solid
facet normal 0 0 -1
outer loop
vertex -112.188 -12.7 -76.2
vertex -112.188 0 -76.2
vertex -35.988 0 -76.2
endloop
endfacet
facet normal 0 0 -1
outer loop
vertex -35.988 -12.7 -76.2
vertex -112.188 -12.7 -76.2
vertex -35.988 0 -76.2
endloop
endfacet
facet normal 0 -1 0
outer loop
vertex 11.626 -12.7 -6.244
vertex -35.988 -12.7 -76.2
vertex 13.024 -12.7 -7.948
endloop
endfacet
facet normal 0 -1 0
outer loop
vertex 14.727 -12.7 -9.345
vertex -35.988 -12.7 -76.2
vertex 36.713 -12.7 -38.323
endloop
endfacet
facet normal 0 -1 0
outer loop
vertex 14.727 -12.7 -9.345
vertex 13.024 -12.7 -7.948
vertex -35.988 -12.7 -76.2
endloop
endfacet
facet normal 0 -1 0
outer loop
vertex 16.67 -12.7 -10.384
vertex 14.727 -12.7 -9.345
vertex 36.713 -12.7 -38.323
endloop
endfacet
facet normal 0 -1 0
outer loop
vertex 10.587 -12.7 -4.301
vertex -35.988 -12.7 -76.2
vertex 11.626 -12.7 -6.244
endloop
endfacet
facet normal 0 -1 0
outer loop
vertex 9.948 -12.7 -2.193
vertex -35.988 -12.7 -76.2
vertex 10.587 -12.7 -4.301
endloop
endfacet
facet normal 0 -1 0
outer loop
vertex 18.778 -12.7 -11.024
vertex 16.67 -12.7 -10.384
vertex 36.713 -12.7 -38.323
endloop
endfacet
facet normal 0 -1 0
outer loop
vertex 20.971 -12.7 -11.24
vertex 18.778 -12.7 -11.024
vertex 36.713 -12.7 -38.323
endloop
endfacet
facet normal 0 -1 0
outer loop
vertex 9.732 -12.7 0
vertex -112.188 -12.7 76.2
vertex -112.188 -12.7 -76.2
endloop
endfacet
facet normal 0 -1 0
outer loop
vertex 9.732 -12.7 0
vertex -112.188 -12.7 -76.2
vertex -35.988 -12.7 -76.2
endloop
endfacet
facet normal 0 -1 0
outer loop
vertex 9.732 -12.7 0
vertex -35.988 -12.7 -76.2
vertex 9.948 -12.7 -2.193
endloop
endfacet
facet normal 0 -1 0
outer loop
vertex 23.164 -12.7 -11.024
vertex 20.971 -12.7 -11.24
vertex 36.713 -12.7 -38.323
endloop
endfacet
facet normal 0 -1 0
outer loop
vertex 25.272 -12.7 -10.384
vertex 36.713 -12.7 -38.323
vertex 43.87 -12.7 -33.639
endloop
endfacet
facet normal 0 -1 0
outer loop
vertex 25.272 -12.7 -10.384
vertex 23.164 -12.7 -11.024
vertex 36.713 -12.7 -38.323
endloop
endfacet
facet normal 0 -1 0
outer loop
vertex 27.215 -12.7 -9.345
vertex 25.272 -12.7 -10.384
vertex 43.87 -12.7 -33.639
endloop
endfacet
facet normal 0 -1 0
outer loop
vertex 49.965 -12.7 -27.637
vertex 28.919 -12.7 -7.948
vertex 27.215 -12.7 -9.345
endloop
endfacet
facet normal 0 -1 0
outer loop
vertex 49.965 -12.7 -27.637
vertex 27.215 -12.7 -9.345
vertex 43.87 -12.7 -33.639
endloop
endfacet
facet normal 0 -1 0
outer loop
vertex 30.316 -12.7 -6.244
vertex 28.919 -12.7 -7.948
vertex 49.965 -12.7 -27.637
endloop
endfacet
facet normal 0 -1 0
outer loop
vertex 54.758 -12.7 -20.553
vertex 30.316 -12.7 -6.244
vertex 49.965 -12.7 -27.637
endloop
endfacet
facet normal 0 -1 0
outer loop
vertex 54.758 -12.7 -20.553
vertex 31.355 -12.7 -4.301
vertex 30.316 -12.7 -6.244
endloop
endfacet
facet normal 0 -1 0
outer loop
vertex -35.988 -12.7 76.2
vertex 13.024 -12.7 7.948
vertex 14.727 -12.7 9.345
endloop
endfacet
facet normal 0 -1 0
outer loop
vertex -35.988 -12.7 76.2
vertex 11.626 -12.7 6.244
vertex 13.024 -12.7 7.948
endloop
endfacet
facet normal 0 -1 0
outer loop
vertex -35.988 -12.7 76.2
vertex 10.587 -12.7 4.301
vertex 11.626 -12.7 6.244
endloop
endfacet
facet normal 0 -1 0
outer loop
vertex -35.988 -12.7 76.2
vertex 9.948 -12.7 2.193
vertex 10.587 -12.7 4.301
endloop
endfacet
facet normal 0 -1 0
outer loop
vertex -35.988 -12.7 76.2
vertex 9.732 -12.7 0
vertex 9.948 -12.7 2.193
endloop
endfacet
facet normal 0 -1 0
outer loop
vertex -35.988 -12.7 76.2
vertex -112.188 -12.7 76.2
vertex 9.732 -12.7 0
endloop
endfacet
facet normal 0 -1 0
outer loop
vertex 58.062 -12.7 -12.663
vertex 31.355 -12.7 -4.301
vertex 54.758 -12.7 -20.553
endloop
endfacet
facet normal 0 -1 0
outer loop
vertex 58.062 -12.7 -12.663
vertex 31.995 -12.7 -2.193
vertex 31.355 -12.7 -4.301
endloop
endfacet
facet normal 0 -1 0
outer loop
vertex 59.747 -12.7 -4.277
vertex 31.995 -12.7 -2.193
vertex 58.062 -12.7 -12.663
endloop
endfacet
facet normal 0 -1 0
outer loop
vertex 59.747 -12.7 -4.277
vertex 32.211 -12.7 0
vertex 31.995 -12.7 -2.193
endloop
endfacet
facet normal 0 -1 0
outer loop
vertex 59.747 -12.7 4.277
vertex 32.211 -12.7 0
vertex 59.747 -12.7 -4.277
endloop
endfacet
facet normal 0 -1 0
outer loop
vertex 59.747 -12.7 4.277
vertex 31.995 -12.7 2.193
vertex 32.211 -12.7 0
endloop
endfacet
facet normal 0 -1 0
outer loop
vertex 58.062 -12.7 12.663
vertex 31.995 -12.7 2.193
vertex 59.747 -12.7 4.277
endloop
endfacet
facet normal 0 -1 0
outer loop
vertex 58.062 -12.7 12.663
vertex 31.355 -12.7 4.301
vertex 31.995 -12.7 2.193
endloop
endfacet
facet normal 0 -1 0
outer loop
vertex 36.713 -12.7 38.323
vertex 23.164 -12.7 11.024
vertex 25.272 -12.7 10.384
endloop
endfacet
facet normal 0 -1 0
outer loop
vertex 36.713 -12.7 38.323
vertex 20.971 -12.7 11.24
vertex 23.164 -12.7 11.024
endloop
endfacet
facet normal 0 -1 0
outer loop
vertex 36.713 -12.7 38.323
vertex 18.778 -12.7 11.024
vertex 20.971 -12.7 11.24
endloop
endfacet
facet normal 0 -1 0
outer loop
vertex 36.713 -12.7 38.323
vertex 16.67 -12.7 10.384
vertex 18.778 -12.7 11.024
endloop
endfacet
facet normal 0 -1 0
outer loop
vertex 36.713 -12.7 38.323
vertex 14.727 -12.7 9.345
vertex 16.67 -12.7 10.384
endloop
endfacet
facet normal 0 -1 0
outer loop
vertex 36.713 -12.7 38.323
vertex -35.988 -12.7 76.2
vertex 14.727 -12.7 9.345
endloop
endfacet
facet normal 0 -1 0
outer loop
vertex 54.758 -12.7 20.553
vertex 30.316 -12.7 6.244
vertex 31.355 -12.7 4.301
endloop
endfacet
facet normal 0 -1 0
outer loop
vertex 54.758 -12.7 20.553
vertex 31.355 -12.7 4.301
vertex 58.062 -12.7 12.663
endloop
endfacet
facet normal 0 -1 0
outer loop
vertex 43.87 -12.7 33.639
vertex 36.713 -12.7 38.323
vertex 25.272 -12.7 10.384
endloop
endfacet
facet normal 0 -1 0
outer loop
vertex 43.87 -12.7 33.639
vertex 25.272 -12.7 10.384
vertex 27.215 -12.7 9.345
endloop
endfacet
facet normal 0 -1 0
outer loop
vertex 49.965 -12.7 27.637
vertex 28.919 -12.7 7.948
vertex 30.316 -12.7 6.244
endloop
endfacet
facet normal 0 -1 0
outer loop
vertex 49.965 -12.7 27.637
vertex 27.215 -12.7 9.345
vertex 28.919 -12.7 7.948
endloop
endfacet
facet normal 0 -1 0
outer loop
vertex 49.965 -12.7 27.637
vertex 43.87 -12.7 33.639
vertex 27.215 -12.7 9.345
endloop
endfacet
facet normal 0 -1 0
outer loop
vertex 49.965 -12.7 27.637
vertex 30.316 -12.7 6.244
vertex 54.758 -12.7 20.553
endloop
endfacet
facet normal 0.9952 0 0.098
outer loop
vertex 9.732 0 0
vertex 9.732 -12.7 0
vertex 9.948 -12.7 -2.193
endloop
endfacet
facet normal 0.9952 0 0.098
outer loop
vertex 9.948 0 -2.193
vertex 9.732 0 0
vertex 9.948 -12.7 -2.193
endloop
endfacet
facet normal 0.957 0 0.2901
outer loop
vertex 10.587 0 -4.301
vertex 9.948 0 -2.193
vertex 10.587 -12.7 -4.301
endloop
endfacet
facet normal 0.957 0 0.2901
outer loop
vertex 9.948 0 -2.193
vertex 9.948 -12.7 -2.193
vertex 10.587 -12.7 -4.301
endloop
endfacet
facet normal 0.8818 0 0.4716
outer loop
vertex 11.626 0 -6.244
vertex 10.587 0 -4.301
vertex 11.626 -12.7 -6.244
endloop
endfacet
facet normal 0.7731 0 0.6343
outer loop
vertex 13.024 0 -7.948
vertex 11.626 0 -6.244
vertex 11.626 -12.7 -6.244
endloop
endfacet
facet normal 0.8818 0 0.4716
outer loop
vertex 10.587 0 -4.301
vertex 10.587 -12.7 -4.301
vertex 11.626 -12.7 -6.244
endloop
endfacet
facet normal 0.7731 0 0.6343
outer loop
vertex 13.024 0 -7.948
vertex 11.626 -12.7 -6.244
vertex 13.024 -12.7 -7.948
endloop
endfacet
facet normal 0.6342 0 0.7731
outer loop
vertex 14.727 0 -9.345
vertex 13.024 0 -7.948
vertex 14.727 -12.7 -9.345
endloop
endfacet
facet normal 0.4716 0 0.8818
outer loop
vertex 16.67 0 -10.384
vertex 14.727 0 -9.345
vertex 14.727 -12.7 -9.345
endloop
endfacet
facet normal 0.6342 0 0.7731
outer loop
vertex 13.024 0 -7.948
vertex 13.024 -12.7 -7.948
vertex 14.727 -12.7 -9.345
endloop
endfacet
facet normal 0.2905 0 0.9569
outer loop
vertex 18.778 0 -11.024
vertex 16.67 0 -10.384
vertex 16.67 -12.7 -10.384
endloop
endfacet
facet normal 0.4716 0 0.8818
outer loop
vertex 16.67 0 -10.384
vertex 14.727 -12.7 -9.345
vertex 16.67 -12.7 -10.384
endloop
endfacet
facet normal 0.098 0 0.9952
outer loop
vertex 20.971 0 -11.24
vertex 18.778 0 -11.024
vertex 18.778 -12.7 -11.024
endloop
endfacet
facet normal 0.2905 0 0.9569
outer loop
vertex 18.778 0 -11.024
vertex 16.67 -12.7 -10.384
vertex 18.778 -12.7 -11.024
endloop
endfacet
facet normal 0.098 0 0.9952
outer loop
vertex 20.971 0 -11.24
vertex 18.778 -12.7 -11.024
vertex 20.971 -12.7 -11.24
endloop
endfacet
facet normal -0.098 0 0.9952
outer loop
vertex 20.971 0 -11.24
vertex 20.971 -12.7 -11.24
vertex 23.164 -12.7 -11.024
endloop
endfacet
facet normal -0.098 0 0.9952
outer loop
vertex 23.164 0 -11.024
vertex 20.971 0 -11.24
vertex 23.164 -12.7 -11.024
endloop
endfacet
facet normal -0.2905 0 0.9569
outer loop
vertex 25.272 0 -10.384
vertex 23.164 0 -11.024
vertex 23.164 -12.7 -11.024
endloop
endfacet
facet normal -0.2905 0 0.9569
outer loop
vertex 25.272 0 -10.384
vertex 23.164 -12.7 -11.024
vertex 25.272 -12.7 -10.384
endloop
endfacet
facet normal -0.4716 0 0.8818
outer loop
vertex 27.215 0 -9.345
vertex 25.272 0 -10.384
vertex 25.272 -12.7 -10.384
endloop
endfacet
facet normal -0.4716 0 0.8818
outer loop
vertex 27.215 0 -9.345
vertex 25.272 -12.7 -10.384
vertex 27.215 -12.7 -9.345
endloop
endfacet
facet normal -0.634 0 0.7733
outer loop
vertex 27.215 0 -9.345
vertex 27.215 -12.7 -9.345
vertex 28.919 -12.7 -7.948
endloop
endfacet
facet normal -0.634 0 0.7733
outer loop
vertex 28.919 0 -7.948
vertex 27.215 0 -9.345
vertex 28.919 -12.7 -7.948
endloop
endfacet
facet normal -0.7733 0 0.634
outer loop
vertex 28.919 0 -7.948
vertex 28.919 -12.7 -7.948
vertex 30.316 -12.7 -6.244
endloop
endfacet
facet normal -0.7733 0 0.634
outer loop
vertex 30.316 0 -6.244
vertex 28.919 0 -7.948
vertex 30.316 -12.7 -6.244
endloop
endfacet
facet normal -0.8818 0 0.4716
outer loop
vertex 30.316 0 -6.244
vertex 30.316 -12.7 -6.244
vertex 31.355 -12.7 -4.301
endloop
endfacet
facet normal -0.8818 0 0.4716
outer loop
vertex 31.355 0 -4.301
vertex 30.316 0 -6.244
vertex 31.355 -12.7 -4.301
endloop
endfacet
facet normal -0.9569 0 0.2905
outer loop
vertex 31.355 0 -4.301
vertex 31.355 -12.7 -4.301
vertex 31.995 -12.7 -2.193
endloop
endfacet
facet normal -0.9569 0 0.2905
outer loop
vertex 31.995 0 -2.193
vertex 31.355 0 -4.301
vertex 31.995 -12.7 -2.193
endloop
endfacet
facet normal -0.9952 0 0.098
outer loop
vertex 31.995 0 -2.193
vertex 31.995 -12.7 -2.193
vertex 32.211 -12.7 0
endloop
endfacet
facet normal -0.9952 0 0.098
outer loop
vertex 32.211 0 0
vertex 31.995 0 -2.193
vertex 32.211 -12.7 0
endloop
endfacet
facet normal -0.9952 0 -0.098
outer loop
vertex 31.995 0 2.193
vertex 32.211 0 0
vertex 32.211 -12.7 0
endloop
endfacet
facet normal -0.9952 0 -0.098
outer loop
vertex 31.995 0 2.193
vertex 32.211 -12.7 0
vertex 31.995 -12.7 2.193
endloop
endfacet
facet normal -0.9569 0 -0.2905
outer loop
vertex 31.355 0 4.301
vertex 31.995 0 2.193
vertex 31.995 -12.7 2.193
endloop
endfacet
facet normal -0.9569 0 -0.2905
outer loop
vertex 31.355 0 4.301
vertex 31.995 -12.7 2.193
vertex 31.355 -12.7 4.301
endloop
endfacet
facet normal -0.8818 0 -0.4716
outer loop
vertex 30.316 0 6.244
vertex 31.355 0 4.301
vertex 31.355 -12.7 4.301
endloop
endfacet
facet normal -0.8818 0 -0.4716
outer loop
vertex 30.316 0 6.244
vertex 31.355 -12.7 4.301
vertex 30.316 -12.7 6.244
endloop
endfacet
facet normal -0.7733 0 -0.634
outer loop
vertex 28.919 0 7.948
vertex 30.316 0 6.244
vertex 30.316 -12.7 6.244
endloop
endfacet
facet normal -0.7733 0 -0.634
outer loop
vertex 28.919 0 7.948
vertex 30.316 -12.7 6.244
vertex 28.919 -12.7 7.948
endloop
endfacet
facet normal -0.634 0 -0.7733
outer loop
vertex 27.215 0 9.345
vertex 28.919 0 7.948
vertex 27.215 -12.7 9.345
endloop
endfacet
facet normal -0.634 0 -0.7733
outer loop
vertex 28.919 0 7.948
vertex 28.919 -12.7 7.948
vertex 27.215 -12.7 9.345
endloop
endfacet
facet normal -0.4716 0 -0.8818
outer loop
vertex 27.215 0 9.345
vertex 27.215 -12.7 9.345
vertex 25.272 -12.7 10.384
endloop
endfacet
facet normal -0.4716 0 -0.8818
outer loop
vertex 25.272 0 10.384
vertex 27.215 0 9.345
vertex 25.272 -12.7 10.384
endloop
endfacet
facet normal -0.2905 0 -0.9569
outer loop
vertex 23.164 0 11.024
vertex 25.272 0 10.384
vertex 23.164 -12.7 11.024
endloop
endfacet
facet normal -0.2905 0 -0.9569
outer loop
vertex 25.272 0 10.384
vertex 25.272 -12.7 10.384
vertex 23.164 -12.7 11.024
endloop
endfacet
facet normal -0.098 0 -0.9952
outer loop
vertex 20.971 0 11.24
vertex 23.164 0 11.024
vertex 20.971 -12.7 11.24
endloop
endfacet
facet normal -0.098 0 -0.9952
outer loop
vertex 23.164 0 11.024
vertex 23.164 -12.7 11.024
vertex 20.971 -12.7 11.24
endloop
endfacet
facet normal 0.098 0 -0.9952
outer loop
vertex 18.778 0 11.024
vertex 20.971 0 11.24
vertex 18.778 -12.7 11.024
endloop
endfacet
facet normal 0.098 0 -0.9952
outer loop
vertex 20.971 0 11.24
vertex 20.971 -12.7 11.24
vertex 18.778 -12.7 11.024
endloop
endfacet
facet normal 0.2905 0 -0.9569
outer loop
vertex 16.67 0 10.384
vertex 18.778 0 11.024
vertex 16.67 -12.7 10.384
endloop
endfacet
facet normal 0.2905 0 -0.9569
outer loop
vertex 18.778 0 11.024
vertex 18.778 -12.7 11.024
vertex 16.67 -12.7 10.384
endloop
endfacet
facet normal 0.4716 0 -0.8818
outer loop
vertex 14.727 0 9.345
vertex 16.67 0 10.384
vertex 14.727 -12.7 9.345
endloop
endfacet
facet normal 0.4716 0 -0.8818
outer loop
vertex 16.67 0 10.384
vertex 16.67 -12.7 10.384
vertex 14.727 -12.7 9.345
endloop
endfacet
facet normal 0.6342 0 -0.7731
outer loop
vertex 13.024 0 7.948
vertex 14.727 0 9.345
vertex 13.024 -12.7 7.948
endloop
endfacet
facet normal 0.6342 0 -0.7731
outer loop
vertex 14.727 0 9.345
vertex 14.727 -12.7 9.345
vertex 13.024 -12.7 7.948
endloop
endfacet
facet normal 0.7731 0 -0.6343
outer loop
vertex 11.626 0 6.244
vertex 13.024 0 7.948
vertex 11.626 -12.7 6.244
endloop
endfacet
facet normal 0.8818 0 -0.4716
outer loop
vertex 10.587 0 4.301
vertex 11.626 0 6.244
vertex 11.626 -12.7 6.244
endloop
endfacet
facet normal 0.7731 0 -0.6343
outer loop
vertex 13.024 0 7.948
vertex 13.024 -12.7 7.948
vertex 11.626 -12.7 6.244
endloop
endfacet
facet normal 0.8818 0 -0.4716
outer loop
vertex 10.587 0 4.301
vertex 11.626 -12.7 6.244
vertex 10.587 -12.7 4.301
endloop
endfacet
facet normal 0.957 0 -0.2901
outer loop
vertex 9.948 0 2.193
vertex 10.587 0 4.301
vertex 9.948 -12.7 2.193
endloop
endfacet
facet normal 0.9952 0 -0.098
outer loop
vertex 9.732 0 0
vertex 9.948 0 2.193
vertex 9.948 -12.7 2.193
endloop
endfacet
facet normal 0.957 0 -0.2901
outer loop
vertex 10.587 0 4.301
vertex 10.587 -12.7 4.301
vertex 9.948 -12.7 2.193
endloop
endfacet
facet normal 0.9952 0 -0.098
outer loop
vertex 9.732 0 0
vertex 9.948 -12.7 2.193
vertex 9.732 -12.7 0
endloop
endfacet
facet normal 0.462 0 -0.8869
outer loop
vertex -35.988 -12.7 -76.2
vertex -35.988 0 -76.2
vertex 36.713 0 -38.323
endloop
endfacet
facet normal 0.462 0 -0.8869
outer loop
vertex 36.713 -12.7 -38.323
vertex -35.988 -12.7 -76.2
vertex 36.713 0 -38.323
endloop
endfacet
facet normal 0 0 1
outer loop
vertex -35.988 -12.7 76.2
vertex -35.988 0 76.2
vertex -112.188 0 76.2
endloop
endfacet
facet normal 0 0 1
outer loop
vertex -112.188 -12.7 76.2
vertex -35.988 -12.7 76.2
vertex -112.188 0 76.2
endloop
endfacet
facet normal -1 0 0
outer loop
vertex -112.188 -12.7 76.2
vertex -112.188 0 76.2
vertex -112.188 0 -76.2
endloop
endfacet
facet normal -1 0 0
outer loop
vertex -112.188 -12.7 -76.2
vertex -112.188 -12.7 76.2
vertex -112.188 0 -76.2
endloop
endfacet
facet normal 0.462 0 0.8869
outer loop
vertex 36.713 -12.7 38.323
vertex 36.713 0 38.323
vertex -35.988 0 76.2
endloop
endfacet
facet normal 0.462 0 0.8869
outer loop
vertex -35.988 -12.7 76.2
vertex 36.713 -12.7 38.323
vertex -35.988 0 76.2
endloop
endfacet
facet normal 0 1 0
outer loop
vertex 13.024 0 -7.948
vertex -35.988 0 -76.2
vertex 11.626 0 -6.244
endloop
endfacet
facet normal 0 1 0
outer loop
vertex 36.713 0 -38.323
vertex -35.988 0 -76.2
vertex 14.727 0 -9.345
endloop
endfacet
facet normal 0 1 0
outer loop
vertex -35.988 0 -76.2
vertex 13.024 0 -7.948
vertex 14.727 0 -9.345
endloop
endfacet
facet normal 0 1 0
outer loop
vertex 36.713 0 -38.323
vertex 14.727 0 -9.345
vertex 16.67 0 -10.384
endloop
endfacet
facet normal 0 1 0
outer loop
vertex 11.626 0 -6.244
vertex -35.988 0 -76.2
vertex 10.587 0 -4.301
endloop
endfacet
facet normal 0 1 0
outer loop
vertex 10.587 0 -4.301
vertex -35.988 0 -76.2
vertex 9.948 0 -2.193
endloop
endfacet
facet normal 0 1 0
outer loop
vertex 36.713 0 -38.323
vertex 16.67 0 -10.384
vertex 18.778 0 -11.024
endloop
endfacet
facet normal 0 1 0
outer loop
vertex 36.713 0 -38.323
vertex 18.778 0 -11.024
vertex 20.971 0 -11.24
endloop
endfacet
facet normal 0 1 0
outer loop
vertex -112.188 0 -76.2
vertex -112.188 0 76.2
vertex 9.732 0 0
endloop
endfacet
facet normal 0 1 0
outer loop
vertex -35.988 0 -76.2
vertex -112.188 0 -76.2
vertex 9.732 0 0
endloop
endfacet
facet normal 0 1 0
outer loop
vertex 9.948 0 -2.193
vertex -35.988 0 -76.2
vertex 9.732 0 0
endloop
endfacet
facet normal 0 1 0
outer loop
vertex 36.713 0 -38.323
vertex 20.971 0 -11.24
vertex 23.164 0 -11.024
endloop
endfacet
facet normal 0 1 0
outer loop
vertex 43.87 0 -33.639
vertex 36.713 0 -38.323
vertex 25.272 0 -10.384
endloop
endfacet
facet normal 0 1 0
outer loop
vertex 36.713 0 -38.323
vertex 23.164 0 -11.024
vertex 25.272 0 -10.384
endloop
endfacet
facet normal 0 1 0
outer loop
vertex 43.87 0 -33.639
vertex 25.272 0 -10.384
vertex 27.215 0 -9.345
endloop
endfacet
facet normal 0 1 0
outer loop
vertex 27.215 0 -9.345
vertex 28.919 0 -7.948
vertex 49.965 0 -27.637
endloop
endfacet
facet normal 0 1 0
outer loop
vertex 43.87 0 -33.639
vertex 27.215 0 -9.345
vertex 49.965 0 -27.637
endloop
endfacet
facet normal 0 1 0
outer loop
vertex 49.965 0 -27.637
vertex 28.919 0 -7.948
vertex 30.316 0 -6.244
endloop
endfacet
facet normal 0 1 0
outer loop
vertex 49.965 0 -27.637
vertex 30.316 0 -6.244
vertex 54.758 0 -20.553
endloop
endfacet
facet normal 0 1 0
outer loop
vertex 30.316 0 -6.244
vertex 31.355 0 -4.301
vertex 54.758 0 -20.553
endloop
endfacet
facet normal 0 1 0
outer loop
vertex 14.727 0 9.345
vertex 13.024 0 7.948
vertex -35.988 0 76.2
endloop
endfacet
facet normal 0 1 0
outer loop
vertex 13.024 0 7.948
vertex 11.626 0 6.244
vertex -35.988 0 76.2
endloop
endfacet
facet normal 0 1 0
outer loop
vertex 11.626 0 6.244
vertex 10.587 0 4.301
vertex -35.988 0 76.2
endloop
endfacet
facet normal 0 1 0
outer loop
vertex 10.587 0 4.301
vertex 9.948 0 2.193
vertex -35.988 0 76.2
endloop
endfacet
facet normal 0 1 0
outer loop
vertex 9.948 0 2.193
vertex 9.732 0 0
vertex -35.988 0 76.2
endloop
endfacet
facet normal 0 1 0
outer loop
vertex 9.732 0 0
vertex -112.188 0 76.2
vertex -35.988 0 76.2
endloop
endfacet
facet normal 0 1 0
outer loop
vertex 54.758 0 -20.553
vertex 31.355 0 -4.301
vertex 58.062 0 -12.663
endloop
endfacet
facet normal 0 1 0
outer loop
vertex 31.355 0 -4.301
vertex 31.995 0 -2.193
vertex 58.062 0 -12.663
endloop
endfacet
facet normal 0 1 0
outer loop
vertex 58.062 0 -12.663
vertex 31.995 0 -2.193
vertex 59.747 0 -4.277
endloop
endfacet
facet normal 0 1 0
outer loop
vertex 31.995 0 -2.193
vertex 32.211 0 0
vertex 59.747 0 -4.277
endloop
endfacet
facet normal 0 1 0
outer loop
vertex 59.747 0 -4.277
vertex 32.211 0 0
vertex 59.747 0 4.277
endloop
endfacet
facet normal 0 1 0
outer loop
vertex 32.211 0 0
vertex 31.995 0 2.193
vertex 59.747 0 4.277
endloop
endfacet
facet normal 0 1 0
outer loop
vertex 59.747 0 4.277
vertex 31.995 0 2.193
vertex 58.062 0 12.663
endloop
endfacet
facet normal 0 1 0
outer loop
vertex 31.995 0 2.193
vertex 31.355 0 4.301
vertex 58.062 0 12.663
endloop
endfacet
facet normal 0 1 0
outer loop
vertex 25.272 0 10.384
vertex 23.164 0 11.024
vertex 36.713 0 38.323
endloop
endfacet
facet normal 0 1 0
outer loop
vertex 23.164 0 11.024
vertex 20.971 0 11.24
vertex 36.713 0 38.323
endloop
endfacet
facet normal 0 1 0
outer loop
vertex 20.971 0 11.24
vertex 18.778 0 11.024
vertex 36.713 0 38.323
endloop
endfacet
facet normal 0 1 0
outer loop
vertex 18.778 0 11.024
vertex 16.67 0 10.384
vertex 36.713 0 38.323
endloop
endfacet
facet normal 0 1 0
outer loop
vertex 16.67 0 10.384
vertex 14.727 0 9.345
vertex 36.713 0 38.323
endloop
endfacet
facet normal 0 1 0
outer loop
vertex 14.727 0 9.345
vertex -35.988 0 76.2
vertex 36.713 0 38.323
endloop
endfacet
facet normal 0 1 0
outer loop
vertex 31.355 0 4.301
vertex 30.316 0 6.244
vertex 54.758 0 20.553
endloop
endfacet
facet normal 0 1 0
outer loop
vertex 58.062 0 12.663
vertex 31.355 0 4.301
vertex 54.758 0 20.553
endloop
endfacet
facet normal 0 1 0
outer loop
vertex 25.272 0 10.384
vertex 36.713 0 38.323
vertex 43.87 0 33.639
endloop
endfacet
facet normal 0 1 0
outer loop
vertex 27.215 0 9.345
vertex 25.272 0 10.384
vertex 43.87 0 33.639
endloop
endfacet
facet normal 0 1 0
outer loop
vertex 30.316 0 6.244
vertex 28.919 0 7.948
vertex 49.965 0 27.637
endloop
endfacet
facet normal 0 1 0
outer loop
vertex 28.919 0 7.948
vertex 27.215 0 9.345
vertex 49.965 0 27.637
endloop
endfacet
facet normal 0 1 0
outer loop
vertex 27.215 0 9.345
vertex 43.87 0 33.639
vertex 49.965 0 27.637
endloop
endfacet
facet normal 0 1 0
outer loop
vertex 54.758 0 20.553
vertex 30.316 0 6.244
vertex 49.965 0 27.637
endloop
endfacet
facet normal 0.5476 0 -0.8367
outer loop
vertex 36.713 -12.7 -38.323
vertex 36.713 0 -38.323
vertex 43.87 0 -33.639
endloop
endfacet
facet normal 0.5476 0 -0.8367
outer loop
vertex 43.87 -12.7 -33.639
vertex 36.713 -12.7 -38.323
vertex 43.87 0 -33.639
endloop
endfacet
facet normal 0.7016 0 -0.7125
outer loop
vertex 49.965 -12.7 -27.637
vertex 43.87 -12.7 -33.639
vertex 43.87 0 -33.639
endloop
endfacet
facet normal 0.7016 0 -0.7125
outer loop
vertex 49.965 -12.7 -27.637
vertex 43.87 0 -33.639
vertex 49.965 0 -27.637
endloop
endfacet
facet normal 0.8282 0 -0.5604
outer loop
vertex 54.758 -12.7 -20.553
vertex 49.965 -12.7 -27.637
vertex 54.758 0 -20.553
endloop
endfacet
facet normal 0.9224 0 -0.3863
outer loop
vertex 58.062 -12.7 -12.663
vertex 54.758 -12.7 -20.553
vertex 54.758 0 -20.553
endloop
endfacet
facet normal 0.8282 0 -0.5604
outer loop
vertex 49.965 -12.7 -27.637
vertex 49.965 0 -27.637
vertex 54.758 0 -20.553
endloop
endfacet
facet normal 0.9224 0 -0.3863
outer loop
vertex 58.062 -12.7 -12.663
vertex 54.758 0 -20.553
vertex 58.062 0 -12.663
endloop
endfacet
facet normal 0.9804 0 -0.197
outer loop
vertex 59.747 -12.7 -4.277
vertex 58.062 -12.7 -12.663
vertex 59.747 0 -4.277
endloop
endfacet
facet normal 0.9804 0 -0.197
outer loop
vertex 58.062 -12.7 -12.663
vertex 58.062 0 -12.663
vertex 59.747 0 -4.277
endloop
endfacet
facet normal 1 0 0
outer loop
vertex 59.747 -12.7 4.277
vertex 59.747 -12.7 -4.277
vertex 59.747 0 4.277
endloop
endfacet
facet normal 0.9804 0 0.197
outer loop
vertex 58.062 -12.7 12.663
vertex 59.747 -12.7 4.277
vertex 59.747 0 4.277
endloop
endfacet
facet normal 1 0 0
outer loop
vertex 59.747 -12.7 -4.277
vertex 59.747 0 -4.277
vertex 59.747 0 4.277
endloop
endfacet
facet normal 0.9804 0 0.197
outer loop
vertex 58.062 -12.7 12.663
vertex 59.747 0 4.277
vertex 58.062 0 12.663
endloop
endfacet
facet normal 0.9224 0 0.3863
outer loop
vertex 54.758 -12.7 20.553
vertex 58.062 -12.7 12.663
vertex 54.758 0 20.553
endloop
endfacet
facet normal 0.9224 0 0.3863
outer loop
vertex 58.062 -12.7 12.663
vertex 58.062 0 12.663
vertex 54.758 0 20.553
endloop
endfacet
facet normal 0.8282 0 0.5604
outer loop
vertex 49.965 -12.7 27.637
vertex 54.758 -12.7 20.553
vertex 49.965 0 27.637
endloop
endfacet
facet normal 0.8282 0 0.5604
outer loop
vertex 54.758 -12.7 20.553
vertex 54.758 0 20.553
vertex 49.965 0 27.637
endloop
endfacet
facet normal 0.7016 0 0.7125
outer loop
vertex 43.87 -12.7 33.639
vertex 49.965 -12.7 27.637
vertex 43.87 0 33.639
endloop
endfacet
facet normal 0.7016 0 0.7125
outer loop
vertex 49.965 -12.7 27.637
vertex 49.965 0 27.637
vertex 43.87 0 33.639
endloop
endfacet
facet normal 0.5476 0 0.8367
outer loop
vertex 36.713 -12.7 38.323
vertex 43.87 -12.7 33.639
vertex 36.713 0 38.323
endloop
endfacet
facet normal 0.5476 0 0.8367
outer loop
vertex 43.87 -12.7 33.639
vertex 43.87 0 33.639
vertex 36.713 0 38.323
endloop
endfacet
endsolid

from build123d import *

# Parameters (mm, degrees)
F1_DEPTH = 12.7
F2_D     = 22.479


with BuildPart() as f1:
    # F0 (on Front) → F1 (new body)
    with BuildSketch(Plane.XZ):
        with BuildLine():
            Line((-35.987624, 76.2), (-112.187624, 76.2))
            Line((-112.187624, 76.2), (-112.187624, -76.2))
            Line((-112.187624, -76.2), (-35.987624, -76.2))
            Line((-35.987624, -76.2), (36.712844, -38.322777))
            ThreePointArc((36.712844, -38.322777), (59.958668, 0), (36.712844, 38.322777))
            Line((36.712844, 38.322777), (-35.987624, 76.2))
        make_face()
    extrude(amount=F1_DEPTH)

    # F2 (through all)
    with Locations(Plane(origin=(0, 0, 0), x_dir=(1, 0, 0), z_dir=(0, 1, 0))):
        with Locations((20.97105, 0)):
            Hole(F2_D / 2)


solid = f1.part
